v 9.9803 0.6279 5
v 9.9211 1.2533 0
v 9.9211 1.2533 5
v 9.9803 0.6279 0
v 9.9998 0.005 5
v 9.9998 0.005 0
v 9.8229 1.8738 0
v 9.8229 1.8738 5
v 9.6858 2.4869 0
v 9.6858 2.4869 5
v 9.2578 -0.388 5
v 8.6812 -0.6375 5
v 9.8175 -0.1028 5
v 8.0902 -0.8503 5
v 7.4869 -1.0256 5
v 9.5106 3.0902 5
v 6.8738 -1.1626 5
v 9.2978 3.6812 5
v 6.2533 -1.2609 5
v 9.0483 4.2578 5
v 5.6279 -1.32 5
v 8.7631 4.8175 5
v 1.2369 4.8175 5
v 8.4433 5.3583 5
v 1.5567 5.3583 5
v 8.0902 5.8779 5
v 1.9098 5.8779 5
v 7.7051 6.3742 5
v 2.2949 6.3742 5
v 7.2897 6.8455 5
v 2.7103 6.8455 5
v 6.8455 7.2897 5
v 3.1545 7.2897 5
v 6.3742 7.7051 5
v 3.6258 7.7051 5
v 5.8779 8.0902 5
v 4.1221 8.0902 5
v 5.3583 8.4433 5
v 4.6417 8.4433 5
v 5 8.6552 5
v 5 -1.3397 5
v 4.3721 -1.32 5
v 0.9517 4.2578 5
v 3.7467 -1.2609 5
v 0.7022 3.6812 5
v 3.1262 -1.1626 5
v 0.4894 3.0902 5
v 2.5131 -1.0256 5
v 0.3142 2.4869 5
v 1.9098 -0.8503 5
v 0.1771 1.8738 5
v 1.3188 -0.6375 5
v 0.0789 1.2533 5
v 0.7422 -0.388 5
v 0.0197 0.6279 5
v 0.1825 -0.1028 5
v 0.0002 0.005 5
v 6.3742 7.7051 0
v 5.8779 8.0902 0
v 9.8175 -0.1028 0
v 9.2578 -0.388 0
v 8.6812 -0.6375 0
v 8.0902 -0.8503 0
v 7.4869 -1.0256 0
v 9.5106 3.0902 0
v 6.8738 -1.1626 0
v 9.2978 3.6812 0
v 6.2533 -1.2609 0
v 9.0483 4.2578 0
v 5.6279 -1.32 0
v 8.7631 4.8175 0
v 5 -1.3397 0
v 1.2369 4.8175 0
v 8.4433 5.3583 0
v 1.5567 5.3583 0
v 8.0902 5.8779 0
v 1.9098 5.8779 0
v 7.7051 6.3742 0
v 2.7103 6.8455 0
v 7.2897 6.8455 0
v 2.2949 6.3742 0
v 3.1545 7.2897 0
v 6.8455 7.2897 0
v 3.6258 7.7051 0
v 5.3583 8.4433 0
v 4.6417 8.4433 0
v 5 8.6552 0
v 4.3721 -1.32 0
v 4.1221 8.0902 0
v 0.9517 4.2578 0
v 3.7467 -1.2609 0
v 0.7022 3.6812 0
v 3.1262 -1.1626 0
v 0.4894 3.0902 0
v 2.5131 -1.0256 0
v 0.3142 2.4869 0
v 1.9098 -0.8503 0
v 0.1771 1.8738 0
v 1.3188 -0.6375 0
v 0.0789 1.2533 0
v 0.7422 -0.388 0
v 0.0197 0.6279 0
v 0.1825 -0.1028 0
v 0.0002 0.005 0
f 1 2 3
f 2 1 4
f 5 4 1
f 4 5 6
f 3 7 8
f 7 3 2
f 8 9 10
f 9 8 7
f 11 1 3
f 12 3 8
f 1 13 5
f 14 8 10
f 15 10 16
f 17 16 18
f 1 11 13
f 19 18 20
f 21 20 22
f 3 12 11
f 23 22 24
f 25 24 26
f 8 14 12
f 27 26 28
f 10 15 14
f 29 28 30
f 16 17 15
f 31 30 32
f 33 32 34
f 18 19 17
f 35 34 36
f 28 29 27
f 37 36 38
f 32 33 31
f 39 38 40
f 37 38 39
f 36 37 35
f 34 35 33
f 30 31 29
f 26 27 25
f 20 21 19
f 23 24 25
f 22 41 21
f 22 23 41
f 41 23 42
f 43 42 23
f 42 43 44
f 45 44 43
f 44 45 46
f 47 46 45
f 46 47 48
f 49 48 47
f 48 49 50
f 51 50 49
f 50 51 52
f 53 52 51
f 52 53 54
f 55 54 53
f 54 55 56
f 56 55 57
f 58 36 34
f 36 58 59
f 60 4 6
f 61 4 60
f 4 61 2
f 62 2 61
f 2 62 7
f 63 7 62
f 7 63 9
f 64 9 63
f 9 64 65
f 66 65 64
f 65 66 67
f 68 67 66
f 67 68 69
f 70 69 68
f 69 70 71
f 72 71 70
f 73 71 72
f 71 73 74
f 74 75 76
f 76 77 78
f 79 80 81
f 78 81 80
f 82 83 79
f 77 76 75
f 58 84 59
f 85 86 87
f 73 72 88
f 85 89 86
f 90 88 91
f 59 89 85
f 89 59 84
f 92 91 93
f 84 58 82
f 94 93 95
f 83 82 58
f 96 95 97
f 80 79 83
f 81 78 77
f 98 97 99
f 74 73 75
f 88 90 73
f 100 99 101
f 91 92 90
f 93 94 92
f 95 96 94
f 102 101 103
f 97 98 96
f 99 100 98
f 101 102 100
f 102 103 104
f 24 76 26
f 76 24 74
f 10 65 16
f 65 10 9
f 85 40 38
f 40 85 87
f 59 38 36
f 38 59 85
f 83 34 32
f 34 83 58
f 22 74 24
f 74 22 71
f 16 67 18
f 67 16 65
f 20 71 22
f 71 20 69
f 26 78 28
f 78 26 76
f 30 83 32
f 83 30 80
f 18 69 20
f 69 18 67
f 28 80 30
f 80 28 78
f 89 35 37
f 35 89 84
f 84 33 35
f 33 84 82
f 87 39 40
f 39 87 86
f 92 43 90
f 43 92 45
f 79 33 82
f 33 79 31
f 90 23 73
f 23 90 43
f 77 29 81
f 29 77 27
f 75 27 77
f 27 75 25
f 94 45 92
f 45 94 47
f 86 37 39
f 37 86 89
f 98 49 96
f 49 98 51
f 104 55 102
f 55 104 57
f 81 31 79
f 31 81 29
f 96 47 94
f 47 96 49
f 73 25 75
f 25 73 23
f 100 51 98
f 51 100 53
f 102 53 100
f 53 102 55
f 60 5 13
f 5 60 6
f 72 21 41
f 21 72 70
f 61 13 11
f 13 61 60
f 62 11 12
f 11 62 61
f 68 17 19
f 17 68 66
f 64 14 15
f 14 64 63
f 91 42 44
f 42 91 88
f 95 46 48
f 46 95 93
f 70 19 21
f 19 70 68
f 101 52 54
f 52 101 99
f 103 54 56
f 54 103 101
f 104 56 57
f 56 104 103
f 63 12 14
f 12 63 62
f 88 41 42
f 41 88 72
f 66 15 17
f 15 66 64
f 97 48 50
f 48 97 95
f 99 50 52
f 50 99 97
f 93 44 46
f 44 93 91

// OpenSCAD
//3つの円柱の交差=ルーローの三角柱
$fn=100;
intersection(){
    cylinder(r=10,h=5);
    translate([10,0,0]){
        cylinder(r=10,h=5);
    }
    translate([5,5*sqrt(3),0]){
        cylinder(r=10,h=5);
    }
}
